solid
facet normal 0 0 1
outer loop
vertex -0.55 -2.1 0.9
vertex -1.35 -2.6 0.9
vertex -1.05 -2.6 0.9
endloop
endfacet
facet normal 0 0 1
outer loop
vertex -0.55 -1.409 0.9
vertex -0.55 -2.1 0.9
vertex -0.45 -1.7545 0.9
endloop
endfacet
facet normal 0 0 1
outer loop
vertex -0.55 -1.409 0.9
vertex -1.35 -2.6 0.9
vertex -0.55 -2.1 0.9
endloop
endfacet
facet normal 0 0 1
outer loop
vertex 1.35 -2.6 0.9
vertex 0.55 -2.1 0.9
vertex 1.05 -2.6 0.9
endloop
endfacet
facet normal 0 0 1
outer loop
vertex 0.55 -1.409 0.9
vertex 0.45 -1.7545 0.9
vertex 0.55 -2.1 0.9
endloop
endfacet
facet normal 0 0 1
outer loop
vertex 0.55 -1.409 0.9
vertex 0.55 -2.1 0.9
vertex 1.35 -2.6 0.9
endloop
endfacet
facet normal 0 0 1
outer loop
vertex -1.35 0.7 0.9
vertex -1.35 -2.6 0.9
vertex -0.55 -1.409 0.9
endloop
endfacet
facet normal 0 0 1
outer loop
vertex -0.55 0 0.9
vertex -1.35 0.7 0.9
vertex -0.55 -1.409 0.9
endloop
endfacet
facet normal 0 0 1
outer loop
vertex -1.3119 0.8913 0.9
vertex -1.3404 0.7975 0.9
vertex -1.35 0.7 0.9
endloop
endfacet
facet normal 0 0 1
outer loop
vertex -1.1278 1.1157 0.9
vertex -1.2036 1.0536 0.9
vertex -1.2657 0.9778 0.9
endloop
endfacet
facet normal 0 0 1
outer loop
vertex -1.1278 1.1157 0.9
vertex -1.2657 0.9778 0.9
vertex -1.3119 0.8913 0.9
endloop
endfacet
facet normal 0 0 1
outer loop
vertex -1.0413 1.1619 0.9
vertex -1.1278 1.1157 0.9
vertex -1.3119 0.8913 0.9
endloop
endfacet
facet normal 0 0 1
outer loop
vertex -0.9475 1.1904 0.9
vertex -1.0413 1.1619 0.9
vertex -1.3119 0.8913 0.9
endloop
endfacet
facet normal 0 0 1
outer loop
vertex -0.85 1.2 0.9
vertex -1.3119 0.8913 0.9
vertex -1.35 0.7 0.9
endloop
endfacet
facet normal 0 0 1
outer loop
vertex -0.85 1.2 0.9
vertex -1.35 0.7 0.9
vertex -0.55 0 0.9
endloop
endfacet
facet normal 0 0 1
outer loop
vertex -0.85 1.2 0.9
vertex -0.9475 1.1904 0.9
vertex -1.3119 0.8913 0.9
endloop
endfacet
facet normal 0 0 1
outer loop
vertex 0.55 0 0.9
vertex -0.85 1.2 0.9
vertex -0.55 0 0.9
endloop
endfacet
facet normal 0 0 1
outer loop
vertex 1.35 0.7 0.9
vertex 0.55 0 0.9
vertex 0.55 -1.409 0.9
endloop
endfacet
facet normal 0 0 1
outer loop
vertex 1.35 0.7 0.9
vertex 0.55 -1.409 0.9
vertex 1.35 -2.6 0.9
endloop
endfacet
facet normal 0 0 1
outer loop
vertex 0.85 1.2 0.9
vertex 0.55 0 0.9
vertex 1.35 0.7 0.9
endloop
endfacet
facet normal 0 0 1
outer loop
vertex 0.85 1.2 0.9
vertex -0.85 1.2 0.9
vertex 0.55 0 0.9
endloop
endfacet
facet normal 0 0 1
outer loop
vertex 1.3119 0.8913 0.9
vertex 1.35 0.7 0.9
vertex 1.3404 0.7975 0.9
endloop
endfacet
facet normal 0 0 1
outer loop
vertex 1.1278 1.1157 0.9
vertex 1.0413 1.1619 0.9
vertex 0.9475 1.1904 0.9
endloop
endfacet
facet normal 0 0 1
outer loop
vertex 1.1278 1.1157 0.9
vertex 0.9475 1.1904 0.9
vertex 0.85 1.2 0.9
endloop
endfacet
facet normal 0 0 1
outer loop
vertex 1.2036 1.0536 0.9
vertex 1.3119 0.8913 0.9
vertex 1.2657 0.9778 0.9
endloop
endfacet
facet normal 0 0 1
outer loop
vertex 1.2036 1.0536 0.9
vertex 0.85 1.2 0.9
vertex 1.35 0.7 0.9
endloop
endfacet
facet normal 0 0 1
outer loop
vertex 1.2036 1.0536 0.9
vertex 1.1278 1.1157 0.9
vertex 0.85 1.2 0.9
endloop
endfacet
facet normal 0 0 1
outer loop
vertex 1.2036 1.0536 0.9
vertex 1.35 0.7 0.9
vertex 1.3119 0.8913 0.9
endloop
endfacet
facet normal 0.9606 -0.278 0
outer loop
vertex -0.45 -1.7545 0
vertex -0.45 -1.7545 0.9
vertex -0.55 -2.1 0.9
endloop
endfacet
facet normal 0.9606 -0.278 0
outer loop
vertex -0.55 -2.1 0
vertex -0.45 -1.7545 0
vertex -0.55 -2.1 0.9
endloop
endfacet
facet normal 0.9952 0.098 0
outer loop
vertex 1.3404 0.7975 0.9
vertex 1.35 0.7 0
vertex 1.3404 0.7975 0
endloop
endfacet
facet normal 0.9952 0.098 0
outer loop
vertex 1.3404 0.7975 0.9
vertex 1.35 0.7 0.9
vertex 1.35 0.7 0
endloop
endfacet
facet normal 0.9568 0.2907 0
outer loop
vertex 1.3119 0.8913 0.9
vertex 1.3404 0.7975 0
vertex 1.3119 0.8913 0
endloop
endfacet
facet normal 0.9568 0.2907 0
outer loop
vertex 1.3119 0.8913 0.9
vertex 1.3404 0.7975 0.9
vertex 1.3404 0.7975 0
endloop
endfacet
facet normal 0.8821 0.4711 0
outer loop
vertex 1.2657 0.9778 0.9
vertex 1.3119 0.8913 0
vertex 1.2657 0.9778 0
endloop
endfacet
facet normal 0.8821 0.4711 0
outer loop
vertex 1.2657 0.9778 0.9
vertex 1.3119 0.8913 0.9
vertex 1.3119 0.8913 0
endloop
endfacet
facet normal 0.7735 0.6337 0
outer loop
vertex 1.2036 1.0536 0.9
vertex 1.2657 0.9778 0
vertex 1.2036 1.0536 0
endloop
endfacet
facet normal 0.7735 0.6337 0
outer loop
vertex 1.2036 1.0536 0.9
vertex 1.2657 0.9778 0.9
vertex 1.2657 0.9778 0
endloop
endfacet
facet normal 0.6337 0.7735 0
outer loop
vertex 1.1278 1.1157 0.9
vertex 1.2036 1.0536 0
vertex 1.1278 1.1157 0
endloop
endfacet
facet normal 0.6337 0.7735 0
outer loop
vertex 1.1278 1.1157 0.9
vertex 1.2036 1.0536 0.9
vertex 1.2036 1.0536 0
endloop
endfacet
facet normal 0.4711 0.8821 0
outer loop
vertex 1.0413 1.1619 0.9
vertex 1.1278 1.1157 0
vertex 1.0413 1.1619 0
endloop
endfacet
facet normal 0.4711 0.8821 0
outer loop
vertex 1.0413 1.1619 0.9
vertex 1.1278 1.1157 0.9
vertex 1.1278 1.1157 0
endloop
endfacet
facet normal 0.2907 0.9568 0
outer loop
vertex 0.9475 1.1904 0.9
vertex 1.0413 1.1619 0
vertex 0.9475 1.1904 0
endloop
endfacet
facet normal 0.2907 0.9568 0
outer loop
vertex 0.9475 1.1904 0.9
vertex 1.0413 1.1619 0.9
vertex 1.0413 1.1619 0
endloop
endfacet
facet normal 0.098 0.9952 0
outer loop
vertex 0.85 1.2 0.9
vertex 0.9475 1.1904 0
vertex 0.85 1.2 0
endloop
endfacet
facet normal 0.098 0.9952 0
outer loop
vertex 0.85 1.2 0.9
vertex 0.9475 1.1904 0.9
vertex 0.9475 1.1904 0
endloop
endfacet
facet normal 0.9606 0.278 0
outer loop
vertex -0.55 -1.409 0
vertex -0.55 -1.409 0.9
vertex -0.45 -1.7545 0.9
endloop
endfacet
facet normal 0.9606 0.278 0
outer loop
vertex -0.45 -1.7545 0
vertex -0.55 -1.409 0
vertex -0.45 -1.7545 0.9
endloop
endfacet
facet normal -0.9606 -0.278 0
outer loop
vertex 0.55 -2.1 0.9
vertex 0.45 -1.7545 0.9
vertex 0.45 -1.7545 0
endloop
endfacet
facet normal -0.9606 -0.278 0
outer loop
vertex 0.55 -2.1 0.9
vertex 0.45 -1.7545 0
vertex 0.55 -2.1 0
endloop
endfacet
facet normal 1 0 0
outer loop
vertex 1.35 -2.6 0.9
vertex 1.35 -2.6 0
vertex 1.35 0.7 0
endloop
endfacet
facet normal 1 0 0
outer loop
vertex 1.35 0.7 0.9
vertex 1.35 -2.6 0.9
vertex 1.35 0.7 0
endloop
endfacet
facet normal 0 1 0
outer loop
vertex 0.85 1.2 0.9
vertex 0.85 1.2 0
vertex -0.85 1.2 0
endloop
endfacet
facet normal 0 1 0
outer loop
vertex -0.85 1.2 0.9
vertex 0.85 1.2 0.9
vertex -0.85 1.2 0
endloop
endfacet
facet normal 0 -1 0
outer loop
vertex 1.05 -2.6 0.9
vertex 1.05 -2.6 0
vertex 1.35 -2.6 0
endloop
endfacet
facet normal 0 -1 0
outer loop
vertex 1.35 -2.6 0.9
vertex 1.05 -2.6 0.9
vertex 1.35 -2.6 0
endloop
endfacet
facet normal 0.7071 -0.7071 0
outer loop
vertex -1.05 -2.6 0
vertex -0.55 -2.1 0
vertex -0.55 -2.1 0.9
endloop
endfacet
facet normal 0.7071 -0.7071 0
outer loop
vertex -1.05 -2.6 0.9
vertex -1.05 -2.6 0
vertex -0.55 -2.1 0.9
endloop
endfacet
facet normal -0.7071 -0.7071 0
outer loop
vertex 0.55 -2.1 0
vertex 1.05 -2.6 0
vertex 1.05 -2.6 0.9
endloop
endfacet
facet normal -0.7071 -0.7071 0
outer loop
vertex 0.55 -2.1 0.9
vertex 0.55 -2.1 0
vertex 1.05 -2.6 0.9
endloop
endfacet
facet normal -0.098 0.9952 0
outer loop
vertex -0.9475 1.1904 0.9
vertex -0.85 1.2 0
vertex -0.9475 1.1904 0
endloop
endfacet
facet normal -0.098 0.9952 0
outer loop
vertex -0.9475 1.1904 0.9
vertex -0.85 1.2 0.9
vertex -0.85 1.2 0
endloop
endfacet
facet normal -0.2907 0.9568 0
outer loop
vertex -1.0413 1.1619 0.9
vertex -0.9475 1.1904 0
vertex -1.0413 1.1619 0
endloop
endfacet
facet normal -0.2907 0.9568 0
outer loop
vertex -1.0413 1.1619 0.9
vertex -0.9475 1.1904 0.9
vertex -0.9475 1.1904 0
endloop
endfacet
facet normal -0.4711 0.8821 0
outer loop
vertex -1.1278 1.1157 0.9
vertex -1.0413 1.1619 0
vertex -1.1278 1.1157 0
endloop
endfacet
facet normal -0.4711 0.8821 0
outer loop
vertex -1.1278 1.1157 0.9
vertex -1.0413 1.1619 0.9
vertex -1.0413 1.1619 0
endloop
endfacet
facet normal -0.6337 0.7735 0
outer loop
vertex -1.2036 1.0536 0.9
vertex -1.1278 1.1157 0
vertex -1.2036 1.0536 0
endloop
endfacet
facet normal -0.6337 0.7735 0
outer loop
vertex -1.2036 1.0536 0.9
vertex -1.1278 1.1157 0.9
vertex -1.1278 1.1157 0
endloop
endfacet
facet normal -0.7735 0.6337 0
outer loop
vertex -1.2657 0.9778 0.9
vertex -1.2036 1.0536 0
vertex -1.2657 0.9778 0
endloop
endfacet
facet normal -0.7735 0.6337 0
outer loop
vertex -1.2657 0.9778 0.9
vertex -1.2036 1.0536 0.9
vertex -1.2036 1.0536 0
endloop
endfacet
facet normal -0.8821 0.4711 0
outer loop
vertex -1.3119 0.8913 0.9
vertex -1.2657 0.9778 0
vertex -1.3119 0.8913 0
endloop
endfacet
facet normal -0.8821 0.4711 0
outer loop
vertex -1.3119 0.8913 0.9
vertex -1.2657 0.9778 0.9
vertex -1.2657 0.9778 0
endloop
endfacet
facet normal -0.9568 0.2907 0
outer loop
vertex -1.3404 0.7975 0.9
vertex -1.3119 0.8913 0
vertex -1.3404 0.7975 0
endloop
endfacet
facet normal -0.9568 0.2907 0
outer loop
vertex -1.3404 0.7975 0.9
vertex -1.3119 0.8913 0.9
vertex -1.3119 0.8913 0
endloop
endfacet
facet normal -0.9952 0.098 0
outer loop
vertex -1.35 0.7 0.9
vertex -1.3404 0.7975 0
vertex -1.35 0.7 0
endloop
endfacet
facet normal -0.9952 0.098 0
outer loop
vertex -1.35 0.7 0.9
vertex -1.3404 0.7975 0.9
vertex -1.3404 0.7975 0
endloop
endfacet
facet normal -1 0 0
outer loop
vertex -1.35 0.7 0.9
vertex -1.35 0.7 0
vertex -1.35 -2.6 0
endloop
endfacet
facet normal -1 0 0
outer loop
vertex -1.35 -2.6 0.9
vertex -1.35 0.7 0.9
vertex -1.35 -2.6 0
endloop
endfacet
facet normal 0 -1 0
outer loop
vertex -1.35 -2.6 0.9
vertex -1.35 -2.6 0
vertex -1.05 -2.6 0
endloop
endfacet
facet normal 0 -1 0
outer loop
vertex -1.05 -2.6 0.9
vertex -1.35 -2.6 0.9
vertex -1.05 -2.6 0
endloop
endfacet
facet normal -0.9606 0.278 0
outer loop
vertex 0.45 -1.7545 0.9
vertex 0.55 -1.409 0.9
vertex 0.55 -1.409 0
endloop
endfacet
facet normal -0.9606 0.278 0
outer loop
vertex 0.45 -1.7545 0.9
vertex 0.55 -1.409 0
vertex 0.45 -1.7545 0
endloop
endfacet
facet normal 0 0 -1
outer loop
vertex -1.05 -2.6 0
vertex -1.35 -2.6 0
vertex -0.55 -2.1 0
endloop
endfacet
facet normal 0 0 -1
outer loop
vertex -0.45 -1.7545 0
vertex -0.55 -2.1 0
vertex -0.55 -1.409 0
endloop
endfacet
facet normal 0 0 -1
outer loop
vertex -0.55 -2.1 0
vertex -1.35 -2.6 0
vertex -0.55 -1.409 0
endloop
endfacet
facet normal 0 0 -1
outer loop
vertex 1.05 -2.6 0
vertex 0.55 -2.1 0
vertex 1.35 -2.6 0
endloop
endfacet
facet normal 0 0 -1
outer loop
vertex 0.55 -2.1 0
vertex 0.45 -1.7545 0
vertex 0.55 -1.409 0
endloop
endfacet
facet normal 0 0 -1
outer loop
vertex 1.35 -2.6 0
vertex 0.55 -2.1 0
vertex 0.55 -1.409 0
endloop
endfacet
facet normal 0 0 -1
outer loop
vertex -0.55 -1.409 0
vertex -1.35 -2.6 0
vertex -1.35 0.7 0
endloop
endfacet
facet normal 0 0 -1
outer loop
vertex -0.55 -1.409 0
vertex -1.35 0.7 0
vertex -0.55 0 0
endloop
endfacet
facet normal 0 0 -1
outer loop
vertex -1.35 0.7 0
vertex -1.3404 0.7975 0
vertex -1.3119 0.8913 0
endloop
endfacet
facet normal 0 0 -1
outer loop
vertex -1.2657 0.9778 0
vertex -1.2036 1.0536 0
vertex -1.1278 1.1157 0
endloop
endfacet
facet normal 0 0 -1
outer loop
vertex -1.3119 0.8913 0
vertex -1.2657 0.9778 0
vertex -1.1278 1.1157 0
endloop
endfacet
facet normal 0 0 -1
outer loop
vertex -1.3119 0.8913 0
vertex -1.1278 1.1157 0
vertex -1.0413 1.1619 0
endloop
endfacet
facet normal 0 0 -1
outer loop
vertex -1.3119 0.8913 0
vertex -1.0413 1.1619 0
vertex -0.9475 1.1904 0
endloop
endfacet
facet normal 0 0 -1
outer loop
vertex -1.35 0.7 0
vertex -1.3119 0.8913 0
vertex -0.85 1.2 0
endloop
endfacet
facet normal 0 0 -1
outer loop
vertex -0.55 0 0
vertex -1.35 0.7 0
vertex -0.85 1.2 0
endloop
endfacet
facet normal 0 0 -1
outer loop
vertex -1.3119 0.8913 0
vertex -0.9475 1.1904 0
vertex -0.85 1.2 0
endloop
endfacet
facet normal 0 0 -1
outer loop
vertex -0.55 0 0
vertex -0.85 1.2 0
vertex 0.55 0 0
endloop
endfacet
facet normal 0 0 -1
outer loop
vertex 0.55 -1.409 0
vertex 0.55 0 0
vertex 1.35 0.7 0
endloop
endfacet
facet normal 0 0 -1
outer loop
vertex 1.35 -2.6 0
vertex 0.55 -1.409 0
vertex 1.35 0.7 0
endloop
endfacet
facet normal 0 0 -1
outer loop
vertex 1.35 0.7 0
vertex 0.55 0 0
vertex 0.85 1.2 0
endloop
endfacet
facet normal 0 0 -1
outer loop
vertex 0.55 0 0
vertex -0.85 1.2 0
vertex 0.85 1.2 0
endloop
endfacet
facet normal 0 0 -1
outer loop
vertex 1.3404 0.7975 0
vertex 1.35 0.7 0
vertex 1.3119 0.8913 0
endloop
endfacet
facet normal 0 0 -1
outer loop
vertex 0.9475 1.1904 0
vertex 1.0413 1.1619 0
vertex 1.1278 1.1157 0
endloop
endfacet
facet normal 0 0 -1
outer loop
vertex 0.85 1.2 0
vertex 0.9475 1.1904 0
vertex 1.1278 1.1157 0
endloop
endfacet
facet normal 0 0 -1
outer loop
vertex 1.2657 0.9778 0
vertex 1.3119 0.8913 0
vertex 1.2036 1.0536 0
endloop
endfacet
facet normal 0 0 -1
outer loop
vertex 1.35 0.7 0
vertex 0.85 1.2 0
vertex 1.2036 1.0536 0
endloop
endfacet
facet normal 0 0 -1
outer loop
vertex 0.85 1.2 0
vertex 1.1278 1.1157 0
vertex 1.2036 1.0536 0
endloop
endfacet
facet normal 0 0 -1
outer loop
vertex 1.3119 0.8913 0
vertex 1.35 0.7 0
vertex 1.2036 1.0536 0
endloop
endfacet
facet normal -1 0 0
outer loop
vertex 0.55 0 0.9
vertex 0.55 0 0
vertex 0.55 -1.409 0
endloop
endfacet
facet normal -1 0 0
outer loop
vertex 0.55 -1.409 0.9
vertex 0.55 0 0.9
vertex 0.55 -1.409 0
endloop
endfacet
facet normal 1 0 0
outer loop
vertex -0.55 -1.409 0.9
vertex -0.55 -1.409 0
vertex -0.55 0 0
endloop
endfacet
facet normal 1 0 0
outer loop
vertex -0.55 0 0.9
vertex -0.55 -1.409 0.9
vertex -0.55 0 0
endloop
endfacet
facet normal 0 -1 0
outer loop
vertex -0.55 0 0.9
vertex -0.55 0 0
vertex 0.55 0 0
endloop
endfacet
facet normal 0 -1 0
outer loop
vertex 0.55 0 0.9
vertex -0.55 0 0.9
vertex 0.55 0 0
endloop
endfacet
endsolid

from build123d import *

# Parameters (mm, degrees)
EXTRUDE_1_DEPTH = 0.9
CHAMFER_1_SIZE  = 0.5
FILLET_1_R      = 0.5
EXTRUDE_2_DEPTH = 0.9


with BuildPart() as part:
    # Эскиз1 → Бобышка-Вытянуть1 (new body)
    with BuildSketch(Plane.XY):
        Polygon((-0.55, 0), (0.55, 0), (0.55, -2.6), (1.35, -2.6), (1.35, 1.2), (-1.35, 1.2), (-1.35, -2.6), (-0.55, -2.6), align=None)
    extrude(amount=EXTRUDE_1_DEPTH)

    # Фаска1
    chamfer_1_edges = [part.edges().sort_by_distance(p)[0] for p in [
        (-0.55, -2.6, 0.45),
        (0.55, -2.6, 0.45),
    ]]
    chamfer(chamfer_1_edges, length=CHAMFER_1_SIZE)

    # Скругление1
    fillet_1_edges = [part.edges().sort_by_distance(p)[0] for p in [
        (-1.35, 1.2, 0.45),
        (1.35, 1.2, 0.45),
    ]]
    fillet(fillet_1_edges, radius=FILLET_1_R)

    # Эскиз2 → Бобышка-Вытянуть2 (add)
    with BuildSketch(Plane.XY.offset(0.9)):
        Polygon((-0.55, -2.1), (-0.55, -1.409040923), (-0.45, -1.754520462), align=None)
    extrude_2 = extrude(amount=-EXTRUDE_2_DEPTH)

    # Зеркальное отражение1: Бобышка-Вытянуть2 across plane
    add(extrude_2.mirror(Plane(origin=(0, 0, 0), x_dir=(0, 0, 1), z_dir=(1, 0, 0))))


solid = part.part
